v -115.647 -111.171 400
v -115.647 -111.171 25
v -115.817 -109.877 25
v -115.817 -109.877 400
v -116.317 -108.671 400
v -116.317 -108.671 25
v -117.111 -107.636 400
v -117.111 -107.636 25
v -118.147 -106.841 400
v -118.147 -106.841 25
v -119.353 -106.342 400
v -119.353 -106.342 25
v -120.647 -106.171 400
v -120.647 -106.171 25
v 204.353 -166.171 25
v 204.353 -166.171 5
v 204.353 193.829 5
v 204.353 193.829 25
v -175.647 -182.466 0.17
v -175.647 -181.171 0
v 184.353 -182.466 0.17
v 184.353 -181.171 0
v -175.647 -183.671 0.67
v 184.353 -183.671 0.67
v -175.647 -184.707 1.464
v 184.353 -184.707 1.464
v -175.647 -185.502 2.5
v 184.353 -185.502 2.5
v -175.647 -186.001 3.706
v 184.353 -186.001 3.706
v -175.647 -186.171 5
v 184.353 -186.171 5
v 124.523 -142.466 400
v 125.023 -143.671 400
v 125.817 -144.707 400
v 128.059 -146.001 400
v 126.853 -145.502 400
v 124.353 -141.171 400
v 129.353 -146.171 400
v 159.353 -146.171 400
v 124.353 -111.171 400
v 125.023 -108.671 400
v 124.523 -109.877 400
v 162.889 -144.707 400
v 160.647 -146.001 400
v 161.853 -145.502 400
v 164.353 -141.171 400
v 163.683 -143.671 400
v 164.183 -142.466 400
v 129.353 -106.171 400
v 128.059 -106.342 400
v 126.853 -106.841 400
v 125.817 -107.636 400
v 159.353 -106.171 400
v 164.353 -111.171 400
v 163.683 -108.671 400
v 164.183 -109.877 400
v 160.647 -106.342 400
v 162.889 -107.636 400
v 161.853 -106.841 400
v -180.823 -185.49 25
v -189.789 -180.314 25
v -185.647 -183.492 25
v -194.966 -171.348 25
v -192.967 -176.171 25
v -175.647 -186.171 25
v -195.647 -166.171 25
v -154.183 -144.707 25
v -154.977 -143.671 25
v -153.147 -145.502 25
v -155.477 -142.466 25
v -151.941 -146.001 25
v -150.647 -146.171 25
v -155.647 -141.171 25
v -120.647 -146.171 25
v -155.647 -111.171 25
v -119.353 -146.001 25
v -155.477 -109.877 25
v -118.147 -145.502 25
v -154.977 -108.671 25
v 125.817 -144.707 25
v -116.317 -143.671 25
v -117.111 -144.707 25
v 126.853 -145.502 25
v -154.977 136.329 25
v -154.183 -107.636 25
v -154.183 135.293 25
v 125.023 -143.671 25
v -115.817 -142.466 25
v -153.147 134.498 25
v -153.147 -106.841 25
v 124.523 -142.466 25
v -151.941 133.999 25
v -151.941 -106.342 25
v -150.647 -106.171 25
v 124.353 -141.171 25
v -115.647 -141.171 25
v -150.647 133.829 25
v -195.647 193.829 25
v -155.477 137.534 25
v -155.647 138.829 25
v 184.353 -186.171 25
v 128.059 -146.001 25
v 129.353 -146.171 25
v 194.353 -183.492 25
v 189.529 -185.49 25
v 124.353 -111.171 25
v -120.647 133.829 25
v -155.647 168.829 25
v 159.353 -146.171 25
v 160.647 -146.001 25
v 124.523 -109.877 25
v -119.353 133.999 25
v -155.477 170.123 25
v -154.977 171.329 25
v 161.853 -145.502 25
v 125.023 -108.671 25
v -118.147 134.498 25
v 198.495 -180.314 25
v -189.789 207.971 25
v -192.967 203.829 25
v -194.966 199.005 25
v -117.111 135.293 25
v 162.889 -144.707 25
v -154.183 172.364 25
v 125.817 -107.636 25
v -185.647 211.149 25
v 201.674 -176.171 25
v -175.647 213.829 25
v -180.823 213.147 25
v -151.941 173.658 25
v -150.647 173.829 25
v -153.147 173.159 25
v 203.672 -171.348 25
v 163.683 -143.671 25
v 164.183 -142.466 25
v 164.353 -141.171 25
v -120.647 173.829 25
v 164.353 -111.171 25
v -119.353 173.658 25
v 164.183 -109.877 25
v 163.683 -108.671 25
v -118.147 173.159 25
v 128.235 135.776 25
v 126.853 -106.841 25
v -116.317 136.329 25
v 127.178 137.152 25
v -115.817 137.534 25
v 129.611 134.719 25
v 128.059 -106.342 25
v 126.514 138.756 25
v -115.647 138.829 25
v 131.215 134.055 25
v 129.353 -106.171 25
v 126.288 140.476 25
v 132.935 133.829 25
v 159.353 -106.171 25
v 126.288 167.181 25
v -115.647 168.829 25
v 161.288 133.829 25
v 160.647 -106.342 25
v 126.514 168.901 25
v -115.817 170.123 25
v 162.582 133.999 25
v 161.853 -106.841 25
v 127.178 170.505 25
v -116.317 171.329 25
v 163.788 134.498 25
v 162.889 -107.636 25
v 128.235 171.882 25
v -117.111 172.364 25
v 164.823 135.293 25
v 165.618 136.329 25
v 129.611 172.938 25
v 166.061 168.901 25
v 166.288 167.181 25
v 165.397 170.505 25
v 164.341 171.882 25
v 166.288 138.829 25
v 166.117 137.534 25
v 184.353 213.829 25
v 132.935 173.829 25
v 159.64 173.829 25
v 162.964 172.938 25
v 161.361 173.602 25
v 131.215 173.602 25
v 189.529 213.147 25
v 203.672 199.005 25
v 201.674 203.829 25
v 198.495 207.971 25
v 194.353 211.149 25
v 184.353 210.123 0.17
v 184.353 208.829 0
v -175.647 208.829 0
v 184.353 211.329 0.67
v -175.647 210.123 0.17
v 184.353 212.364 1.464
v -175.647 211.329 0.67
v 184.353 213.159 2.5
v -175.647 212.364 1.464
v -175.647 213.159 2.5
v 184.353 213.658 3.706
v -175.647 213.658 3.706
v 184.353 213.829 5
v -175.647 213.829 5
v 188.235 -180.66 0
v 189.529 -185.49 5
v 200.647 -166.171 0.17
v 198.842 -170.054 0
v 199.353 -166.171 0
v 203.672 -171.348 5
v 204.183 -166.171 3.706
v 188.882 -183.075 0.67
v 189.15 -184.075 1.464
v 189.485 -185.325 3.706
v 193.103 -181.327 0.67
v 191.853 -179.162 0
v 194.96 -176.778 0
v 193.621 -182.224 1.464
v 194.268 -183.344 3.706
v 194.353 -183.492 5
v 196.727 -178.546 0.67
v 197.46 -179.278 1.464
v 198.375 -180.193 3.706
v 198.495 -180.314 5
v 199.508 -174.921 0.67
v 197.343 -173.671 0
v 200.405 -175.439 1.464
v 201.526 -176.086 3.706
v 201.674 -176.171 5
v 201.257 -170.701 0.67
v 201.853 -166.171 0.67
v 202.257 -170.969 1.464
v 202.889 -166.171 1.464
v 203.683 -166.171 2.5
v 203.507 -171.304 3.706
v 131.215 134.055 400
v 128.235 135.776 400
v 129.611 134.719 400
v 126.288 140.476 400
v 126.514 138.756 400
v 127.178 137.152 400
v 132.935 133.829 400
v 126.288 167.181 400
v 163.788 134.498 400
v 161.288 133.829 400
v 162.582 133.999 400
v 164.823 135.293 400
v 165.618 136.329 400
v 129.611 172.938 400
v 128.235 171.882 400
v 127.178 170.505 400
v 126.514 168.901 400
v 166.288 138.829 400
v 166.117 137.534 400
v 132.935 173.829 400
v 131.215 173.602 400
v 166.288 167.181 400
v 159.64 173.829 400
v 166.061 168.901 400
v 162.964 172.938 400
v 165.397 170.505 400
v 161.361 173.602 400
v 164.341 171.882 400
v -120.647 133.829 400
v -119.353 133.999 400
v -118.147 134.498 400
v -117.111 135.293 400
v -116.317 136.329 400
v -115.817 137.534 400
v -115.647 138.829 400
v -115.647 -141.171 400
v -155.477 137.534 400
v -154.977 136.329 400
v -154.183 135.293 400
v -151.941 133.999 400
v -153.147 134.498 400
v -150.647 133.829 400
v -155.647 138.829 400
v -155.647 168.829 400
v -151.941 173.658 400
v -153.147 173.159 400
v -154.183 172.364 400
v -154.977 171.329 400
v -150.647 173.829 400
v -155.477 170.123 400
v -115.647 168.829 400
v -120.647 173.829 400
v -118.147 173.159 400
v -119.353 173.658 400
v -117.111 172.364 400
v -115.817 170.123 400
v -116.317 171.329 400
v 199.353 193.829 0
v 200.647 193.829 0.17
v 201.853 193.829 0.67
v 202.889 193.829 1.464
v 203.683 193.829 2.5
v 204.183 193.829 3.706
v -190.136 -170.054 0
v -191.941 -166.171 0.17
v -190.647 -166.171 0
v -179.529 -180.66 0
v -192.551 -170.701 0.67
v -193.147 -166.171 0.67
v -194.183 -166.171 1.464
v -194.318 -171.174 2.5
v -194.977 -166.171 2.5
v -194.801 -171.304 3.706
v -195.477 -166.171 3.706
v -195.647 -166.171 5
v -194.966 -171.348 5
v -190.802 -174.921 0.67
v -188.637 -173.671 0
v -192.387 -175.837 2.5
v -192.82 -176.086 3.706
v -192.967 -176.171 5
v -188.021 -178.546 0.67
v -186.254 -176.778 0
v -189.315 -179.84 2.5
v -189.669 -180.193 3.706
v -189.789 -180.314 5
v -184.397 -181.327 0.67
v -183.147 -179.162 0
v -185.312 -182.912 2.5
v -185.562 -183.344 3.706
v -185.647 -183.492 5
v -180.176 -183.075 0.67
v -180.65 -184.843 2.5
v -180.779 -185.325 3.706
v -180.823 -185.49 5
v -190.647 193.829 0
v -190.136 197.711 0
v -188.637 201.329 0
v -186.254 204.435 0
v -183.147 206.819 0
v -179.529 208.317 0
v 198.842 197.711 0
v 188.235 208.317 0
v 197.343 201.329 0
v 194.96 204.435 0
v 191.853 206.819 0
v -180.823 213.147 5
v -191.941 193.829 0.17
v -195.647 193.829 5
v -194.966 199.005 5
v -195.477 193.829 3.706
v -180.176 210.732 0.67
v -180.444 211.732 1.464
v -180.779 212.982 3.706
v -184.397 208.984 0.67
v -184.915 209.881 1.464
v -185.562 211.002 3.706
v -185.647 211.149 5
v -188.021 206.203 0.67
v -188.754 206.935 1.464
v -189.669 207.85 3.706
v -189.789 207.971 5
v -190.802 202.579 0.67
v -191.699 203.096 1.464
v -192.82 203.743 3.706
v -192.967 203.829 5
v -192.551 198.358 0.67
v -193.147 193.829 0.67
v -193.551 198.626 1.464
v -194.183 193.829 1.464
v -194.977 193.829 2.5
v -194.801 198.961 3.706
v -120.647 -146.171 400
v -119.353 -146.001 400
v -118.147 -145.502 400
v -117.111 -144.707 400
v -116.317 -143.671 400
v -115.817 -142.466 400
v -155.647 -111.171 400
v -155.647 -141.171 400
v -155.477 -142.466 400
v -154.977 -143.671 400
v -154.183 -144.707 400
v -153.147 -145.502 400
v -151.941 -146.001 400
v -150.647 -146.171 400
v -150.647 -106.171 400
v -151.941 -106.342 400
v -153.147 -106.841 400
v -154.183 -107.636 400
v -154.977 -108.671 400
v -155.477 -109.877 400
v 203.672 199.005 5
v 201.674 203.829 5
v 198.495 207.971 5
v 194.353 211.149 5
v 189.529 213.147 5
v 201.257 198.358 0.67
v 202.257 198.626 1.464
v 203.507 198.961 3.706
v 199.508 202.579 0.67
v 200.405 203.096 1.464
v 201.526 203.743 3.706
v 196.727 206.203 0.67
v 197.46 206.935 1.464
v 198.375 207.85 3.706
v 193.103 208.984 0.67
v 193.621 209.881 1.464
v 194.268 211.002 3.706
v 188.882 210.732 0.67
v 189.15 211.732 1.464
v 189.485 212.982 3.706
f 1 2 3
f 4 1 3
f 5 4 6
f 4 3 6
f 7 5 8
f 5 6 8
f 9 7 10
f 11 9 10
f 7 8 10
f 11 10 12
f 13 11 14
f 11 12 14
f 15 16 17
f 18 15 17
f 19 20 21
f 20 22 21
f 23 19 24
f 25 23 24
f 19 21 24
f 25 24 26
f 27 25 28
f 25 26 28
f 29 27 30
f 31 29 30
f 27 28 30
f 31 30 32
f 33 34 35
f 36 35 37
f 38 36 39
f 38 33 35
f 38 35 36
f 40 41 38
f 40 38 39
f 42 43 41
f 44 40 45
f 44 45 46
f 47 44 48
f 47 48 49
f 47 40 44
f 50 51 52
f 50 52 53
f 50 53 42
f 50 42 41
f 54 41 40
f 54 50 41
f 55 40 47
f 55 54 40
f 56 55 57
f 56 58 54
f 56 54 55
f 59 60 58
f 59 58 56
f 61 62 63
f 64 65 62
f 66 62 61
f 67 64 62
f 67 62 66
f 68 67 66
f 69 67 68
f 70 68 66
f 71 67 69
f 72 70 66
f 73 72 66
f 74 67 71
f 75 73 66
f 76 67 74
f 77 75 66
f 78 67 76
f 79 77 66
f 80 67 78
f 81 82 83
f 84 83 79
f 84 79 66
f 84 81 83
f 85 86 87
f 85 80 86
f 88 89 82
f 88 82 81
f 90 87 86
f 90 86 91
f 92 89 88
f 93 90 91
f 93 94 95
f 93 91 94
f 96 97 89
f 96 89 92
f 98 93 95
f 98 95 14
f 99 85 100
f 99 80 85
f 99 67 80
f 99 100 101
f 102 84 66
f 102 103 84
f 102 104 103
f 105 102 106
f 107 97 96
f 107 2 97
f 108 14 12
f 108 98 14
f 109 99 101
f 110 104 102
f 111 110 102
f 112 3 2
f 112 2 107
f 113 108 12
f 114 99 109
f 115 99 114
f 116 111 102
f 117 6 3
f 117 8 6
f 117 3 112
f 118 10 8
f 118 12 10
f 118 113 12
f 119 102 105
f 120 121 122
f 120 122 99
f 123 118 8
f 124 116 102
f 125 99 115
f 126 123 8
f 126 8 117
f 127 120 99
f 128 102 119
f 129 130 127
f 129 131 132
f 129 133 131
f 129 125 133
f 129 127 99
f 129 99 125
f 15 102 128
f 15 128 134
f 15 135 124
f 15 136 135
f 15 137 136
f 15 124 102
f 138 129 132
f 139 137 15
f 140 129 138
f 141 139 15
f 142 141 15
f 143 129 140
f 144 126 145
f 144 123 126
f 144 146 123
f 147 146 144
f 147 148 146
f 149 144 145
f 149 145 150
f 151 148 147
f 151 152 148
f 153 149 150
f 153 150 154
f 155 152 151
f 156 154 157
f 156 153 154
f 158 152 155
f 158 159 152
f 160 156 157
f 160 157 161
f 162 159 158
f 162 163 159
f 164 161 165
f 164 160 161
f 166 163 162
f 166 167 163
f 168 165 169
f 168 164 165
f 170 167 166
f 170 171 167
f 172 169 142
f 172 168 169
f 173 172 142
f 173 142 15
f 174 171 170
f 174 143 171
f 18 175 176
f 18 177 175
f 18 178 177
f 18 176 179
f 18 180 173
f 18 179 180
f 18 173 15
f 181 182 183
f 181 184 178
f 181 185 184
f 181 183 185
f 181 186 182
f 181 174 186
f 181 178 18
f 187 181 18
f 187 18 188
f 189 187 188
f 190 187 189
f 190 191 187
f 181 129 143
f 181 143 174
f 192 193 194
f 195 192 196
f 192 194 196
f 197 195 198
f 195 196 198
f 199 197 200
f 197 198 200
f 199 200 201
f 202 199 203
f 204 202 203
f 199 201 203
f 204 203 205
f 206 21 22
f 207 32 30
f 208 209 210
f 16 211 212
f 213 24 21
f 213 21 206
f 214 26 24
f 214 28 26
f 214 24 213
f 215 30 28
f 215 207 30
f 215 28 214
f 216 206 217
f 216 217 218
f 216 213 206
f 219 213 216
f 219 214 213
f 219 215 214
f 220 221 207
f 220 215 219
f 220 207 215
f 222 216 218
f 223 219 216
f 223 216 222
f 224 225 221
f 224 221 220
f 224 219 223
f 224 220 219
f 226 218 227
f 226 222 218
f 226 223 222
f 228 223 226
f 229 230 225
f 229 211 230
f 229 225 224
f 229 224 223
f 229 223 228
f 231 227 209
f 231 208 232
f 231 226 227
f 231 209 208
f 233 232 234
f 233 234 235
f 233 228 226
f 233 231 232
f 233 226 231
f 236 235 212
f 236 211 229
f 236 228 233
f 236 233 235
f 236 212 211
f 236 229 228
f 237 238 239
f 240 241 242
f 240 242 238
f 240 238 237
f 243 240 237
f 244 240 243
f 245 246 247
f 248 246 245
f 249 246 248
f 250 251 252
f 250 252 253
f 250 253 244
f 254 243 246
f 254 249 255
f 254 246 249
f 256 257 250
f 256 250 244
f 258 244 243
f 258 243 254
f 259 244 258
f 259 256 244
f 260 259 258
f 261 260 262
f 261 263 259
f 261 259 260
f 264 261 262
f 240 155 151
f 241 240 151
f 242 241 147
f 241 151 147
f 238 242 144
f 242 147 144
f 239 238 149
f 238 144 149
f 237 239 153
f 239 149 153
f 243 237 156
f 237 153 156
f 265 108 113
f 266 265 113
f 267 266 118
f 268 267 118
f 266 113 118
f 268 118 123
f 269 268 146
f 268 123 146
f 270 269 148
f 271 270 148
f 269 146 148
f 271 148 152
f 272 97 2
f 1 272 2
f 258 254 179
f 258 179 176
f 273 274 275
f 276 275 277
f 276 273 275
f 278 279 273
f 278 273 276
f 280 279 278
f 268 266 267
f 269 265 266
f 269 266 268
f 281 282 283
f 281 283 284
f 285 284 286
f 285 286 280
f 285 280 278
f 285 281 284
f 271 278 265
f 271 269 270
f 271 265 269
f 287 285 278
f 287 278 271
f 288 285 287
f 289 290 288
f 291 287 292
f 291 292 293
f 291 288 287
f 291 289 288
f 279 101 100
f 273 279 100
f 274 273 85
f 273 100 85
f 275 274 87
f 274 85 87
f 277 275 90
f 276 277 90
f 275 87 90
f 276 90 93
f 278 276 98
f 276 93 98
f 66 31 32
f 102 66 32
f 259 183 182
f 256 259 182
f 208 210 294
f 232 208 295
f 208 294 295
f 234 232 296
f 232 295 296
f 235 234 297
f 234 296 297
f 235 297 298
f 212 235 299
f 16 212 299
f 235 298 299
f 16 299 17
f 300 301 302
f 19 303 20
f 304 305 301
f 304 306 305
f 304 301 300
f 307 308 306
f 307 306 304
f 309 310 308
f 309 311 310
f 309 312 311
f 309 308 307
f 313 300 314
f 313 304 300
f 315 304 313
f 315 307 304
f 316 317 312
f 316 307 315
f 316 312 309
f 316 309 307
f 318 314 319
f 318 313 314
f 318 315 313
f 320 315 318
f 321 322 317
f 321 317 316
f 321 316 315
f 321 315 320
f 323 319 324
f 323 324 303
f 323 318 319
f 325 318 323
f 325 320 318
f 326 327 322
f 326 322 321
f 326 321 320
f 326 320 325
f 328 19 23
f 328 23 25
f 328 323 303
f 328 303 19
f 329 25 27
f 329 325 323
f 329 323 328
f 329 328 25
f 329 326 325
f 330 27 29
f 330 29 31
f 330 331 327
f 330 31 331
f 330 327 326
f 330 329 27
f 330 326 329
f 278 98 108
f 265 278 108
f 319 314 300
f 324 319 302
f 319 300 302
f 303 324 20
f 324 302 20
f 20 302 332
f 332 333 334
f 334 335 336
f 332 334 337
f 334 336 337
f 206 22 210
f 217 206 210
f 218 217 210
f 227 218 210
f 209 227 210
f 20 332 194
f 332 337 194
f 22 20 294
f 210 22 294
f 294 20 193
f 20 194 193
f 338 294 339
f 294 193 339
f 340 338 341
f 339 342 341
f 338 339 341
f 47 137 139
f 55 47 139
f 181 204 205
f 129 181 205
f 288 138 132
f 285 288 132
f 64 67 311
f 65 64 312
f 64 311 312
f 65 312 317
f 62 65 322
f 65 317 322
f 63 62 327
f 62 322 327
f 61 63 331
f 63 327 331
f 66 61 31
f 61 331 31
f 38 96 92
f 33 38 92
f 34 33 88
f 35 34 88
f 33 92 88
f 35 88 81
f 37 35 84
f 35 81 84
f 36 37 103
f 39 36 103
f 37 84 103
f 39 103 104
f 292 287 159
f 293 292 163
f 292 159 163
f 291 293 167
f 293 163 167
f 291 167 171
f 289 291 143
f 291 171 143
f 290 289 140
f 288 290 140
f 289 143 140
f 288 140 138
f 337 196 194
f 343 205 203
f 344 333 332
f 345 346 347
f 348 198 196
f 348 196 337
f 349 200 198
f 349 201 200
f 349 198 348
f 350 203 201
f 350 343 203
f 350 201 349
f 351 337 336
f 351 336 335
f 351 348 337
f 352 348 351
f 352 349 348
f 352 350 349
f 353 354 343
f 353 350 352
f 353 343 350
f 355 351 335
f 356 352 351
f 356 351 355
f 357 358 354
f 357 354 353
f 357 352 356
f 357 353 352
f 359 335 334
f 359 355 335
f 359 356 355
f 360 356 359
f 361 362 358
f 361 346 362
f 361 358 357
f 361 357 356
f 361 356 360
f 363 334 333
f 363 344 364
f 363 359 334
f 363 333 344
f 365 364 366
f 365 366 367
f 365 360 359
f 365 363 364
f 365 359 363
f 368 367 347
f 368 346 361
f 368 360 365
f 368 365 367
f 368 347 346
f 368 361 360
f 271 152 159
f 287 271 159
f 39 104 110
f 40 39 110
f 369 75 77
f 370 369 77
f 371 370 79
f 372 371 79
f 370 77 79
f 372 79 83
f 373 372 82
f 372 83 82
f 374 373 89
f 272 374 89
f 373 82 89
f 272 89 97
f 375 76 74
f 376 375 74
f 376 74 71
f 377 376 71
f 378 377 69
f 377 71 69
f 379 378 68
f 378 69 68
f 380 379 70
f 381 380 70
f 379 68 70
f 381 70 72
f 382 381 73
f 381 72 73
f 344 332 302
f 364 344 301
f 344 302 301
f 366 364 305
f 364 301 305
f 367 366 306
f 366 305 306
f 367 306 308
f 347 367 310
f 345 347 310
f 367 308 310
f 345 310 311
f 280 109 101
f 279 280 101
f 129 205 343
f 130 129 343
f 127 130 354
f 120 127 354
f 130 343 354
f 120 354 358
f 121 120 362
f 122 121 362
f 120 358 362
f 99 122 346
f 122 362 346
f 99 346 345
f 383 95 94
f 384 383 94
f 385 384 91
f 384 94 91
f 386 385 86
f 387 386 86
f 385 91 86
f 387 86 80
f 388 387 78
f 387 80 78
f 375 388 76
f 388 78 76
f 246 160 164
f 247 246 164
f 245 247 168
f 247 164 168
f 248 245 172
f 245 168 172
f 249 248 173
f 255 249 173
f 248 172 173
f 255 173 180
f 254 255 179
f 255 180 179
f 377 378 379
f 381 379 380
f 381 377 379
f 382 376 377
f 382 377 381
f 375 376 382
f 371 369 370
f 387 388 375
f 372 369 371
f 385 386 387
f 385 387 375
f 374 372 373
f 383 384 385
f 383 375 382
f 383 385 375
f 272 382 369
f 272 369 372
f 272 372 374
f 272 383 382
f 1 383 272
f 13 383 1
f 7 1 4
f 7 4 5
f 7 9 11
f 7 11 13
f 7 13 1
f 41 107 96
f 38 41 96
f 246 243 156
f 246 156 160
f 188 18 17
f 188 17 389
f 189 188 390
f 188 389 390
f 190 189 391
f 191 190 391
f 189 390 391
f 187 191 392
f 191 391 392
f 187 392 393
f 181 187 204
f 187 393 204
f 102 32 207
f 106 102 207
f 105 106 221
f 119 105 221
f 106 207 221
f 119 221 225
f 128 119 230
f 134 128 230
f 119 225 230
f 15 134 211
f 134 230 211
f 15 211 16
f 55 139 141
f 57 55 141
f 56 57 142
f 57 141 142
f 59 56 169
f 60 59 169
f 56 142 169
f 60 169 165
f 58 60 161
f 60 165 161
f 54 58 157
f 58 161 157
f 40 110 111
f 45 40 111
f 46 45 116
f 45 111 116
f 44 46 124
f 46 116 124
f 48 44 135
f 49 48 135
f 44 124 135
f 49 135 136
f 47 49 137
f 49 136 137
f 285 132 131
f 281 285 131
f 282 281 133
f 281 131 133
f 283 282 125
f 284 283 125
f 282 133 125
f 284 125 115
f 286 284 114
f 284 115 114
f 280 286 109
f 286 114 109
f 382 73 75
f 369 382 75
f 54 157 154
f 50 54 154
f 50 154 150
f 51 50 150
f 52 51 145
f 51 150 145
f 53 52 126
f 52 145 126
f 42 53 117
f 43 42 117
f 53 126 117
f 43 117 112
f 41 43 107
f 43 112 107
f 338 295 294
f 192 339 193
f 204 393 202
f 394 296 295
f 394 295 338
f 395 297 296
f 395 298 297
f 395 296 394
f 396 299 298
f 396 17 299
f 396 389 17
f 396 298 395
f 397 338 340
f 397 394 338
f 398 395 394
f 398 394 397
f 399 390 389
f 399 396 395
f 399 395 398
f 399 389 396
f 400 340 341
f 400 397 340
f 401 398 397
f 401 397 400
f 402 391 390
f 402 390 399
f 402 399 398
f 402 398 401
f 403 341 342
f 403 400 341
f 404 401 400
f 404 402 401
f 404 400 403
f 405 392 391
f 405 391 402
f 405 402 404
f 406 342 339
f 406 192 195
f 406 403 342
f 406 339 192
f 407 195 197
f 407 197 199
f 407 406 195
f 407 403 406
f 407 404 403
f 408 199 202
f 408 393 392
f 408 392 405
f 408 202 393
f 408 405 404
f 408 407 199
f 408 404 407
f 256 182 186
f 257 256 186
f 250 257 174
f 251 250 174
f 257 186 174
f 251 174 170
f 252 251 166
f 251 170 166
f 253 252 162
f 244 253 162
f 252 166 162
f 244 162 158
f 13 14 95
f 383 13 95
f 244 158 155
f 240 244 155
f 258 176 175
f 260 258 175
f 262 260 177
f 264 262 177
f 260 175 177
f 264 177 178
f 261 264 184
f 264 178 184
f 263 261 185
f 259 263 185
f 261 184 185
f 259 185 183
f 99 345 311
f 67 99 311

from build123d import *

# Parameters (mm, degrees)
F1_DEPTH = 25
F6_DEPTH = 375
F7_R     = 5


with BuildPart() as f1:
    # F0 (on Top) → F1 (new body)
    with BuildSketch(Plane.XY):
        with BuildLine():
            Line((184.353015, 213.828545), (-175.646985, 213.828545))
            ThreePointArc((-175.646985, 213.828545), (-189.789121, 207.97068), (-195.646985, 193.828545))
            Line((-195.646985, 193.828545), (-195.646985, -166.171455))
            ThreePointArc((-195.646985, -166.171455), (-189.789121, -180.313591), (-175.646985, -186.171455))
            Line((-175.646985, -186.171455), (184.353015, -186.171455))
            ThreePointArc((184.353015, -186.171455), (198.49515, -180.313591), (204.353015, -166.171455))
            Line((204.353015, -166.171455), (204.353015, 193.828545))
            ThreePointArc((204.353015, 193.828545), (198.49515, 207.97068), (184.353015, 213.828545))
        make_face()
    extrude(amount=F1_DEPTH)

    # F2 (on face) + F3 (on face) + F4 (on face) + F5 (on face) → F6 (join)
    with BuildSketch(Plane.XY.offset(25)):
        with BuildLine():
            Line((-120.646985, 173.828545), (-150.646985, 173.828545))
            ThreePointArc((-150.646985, 173.828545), (-154.182519, 172.364079), (-155.646985, 168.828545))
            Line((-155.646985, 168.828545), (-155.646985, 138.828545))
            ThreePointArc((-155.646985, 138.828545), (-154.182519, 135.293011), (-150.646985, 133.828545))
            Line((-150.646985, 133.828545), (-120.646985, 133.828545))
            ThreePointArc((-120.646985, 133.828545), (-117.111451, 135.293011), (-115.646985, 138.828545))
            Line((-115.646985, 138.828545), (-115.646985, 168.828545))
            ThreePointArc((-115.646985, 168.828545), (-117.111451, 172.364079), (-120.646985, 173.828545))
        make_face()
    with BuildSketch(Plane.XY.offset(25)):
        with BuildLine():
            Line((-120.646985, -106.171455), (-150.646985, -106.171455))
            ThreePointArc((-150.646985, -106.171455), (-154.182519, -107.635921), (-155.646985, -111.171455))
            Line((-155.646985, -111.171455), (-155.646985, -141.171455))
            ThreePointArc((-155.646985, -141.171455), (-154.182519, -144.706989), (-150.646985, -146.171455))
            Line((-150.646985, -146.171455), (-120.646985, -146.171455))
            ThreePointArc((-120.646985, -146.171455), (-117.111451, -144.706989), (-115.646985, -141.171455))
            Line((-115.646985, -141.171455), (-115.646985, -111.171455))
            ThreePointArc((-115.646985, -111.171455), (-117.111451, -107.635921), (-120.646985, -106.171455))
        make_face()
    with BuildSketch(Plane.XY.offset(25)):
        with BuildLine():
            Line((159.640082, 173.828545), (132.935292, 173.828545))
            ThreePointArc((132.935292, 173.828545), (128.234725, 171.881506), (126.287687, 167.18094))
            Line((126.287687, 167.18094), (126.287687, 140.476149))
            ThreePointArc((126.287687, 140.476149), (128.234725, 135.775583), (132.935292, 133.828545))
            Line((132.935292, 133.828545), (161.287687, 133.828545))
            ThreePointArc((161.287687, 133.828545), (164.823221, 135.293011), (166.287687, 138.828545))
            Line((166.287687, 138.828545), (166.287687, 167.18094))
            ThreePointArc((166.287687, 167.18094), (164.340649, 171.881506), (159.640082, 173.828545))
        make_face()
    with BuildSketch(Plane.XY.offset(25)):
        with BuildLine():
            Line((159.353015, -106.171455), (129.353015, -106.171455))
            ThreePointArc((129.353015, -106.171455), (125.817481, -107.635921), (124.353015, -111.171455))
            Line((124.353015, -111.171455), (124.353015, -141.171455))
            ThreePointArc((124.353015, -141.171455), (125.817481, -144.706989), (129.353015, -146.171455))
            Line((129.353015, -146.171455), (159.353015, -146.171455))
            ThreePointArc((159.353015, -146.171455), (162.888549, -144.706989), (164.353015, -141.171455))
            Line((164.353015, -141.171455), (164.353015, -111.171455))
            ThreePointArc((164.353015, -111.171455), (162.888549, -107.635921), (159.353015, -106.171455))
        make_face()
    extrude(amount=F6_DEPTH)

    # F7
    f7_edges = [f1.edges().sort_by_distance(p)[0] for p in [
        (4.353015, -186.171455, 0),
    ]]
    fillet(f7_edges, radius=F7_R)


solid = f1.part
